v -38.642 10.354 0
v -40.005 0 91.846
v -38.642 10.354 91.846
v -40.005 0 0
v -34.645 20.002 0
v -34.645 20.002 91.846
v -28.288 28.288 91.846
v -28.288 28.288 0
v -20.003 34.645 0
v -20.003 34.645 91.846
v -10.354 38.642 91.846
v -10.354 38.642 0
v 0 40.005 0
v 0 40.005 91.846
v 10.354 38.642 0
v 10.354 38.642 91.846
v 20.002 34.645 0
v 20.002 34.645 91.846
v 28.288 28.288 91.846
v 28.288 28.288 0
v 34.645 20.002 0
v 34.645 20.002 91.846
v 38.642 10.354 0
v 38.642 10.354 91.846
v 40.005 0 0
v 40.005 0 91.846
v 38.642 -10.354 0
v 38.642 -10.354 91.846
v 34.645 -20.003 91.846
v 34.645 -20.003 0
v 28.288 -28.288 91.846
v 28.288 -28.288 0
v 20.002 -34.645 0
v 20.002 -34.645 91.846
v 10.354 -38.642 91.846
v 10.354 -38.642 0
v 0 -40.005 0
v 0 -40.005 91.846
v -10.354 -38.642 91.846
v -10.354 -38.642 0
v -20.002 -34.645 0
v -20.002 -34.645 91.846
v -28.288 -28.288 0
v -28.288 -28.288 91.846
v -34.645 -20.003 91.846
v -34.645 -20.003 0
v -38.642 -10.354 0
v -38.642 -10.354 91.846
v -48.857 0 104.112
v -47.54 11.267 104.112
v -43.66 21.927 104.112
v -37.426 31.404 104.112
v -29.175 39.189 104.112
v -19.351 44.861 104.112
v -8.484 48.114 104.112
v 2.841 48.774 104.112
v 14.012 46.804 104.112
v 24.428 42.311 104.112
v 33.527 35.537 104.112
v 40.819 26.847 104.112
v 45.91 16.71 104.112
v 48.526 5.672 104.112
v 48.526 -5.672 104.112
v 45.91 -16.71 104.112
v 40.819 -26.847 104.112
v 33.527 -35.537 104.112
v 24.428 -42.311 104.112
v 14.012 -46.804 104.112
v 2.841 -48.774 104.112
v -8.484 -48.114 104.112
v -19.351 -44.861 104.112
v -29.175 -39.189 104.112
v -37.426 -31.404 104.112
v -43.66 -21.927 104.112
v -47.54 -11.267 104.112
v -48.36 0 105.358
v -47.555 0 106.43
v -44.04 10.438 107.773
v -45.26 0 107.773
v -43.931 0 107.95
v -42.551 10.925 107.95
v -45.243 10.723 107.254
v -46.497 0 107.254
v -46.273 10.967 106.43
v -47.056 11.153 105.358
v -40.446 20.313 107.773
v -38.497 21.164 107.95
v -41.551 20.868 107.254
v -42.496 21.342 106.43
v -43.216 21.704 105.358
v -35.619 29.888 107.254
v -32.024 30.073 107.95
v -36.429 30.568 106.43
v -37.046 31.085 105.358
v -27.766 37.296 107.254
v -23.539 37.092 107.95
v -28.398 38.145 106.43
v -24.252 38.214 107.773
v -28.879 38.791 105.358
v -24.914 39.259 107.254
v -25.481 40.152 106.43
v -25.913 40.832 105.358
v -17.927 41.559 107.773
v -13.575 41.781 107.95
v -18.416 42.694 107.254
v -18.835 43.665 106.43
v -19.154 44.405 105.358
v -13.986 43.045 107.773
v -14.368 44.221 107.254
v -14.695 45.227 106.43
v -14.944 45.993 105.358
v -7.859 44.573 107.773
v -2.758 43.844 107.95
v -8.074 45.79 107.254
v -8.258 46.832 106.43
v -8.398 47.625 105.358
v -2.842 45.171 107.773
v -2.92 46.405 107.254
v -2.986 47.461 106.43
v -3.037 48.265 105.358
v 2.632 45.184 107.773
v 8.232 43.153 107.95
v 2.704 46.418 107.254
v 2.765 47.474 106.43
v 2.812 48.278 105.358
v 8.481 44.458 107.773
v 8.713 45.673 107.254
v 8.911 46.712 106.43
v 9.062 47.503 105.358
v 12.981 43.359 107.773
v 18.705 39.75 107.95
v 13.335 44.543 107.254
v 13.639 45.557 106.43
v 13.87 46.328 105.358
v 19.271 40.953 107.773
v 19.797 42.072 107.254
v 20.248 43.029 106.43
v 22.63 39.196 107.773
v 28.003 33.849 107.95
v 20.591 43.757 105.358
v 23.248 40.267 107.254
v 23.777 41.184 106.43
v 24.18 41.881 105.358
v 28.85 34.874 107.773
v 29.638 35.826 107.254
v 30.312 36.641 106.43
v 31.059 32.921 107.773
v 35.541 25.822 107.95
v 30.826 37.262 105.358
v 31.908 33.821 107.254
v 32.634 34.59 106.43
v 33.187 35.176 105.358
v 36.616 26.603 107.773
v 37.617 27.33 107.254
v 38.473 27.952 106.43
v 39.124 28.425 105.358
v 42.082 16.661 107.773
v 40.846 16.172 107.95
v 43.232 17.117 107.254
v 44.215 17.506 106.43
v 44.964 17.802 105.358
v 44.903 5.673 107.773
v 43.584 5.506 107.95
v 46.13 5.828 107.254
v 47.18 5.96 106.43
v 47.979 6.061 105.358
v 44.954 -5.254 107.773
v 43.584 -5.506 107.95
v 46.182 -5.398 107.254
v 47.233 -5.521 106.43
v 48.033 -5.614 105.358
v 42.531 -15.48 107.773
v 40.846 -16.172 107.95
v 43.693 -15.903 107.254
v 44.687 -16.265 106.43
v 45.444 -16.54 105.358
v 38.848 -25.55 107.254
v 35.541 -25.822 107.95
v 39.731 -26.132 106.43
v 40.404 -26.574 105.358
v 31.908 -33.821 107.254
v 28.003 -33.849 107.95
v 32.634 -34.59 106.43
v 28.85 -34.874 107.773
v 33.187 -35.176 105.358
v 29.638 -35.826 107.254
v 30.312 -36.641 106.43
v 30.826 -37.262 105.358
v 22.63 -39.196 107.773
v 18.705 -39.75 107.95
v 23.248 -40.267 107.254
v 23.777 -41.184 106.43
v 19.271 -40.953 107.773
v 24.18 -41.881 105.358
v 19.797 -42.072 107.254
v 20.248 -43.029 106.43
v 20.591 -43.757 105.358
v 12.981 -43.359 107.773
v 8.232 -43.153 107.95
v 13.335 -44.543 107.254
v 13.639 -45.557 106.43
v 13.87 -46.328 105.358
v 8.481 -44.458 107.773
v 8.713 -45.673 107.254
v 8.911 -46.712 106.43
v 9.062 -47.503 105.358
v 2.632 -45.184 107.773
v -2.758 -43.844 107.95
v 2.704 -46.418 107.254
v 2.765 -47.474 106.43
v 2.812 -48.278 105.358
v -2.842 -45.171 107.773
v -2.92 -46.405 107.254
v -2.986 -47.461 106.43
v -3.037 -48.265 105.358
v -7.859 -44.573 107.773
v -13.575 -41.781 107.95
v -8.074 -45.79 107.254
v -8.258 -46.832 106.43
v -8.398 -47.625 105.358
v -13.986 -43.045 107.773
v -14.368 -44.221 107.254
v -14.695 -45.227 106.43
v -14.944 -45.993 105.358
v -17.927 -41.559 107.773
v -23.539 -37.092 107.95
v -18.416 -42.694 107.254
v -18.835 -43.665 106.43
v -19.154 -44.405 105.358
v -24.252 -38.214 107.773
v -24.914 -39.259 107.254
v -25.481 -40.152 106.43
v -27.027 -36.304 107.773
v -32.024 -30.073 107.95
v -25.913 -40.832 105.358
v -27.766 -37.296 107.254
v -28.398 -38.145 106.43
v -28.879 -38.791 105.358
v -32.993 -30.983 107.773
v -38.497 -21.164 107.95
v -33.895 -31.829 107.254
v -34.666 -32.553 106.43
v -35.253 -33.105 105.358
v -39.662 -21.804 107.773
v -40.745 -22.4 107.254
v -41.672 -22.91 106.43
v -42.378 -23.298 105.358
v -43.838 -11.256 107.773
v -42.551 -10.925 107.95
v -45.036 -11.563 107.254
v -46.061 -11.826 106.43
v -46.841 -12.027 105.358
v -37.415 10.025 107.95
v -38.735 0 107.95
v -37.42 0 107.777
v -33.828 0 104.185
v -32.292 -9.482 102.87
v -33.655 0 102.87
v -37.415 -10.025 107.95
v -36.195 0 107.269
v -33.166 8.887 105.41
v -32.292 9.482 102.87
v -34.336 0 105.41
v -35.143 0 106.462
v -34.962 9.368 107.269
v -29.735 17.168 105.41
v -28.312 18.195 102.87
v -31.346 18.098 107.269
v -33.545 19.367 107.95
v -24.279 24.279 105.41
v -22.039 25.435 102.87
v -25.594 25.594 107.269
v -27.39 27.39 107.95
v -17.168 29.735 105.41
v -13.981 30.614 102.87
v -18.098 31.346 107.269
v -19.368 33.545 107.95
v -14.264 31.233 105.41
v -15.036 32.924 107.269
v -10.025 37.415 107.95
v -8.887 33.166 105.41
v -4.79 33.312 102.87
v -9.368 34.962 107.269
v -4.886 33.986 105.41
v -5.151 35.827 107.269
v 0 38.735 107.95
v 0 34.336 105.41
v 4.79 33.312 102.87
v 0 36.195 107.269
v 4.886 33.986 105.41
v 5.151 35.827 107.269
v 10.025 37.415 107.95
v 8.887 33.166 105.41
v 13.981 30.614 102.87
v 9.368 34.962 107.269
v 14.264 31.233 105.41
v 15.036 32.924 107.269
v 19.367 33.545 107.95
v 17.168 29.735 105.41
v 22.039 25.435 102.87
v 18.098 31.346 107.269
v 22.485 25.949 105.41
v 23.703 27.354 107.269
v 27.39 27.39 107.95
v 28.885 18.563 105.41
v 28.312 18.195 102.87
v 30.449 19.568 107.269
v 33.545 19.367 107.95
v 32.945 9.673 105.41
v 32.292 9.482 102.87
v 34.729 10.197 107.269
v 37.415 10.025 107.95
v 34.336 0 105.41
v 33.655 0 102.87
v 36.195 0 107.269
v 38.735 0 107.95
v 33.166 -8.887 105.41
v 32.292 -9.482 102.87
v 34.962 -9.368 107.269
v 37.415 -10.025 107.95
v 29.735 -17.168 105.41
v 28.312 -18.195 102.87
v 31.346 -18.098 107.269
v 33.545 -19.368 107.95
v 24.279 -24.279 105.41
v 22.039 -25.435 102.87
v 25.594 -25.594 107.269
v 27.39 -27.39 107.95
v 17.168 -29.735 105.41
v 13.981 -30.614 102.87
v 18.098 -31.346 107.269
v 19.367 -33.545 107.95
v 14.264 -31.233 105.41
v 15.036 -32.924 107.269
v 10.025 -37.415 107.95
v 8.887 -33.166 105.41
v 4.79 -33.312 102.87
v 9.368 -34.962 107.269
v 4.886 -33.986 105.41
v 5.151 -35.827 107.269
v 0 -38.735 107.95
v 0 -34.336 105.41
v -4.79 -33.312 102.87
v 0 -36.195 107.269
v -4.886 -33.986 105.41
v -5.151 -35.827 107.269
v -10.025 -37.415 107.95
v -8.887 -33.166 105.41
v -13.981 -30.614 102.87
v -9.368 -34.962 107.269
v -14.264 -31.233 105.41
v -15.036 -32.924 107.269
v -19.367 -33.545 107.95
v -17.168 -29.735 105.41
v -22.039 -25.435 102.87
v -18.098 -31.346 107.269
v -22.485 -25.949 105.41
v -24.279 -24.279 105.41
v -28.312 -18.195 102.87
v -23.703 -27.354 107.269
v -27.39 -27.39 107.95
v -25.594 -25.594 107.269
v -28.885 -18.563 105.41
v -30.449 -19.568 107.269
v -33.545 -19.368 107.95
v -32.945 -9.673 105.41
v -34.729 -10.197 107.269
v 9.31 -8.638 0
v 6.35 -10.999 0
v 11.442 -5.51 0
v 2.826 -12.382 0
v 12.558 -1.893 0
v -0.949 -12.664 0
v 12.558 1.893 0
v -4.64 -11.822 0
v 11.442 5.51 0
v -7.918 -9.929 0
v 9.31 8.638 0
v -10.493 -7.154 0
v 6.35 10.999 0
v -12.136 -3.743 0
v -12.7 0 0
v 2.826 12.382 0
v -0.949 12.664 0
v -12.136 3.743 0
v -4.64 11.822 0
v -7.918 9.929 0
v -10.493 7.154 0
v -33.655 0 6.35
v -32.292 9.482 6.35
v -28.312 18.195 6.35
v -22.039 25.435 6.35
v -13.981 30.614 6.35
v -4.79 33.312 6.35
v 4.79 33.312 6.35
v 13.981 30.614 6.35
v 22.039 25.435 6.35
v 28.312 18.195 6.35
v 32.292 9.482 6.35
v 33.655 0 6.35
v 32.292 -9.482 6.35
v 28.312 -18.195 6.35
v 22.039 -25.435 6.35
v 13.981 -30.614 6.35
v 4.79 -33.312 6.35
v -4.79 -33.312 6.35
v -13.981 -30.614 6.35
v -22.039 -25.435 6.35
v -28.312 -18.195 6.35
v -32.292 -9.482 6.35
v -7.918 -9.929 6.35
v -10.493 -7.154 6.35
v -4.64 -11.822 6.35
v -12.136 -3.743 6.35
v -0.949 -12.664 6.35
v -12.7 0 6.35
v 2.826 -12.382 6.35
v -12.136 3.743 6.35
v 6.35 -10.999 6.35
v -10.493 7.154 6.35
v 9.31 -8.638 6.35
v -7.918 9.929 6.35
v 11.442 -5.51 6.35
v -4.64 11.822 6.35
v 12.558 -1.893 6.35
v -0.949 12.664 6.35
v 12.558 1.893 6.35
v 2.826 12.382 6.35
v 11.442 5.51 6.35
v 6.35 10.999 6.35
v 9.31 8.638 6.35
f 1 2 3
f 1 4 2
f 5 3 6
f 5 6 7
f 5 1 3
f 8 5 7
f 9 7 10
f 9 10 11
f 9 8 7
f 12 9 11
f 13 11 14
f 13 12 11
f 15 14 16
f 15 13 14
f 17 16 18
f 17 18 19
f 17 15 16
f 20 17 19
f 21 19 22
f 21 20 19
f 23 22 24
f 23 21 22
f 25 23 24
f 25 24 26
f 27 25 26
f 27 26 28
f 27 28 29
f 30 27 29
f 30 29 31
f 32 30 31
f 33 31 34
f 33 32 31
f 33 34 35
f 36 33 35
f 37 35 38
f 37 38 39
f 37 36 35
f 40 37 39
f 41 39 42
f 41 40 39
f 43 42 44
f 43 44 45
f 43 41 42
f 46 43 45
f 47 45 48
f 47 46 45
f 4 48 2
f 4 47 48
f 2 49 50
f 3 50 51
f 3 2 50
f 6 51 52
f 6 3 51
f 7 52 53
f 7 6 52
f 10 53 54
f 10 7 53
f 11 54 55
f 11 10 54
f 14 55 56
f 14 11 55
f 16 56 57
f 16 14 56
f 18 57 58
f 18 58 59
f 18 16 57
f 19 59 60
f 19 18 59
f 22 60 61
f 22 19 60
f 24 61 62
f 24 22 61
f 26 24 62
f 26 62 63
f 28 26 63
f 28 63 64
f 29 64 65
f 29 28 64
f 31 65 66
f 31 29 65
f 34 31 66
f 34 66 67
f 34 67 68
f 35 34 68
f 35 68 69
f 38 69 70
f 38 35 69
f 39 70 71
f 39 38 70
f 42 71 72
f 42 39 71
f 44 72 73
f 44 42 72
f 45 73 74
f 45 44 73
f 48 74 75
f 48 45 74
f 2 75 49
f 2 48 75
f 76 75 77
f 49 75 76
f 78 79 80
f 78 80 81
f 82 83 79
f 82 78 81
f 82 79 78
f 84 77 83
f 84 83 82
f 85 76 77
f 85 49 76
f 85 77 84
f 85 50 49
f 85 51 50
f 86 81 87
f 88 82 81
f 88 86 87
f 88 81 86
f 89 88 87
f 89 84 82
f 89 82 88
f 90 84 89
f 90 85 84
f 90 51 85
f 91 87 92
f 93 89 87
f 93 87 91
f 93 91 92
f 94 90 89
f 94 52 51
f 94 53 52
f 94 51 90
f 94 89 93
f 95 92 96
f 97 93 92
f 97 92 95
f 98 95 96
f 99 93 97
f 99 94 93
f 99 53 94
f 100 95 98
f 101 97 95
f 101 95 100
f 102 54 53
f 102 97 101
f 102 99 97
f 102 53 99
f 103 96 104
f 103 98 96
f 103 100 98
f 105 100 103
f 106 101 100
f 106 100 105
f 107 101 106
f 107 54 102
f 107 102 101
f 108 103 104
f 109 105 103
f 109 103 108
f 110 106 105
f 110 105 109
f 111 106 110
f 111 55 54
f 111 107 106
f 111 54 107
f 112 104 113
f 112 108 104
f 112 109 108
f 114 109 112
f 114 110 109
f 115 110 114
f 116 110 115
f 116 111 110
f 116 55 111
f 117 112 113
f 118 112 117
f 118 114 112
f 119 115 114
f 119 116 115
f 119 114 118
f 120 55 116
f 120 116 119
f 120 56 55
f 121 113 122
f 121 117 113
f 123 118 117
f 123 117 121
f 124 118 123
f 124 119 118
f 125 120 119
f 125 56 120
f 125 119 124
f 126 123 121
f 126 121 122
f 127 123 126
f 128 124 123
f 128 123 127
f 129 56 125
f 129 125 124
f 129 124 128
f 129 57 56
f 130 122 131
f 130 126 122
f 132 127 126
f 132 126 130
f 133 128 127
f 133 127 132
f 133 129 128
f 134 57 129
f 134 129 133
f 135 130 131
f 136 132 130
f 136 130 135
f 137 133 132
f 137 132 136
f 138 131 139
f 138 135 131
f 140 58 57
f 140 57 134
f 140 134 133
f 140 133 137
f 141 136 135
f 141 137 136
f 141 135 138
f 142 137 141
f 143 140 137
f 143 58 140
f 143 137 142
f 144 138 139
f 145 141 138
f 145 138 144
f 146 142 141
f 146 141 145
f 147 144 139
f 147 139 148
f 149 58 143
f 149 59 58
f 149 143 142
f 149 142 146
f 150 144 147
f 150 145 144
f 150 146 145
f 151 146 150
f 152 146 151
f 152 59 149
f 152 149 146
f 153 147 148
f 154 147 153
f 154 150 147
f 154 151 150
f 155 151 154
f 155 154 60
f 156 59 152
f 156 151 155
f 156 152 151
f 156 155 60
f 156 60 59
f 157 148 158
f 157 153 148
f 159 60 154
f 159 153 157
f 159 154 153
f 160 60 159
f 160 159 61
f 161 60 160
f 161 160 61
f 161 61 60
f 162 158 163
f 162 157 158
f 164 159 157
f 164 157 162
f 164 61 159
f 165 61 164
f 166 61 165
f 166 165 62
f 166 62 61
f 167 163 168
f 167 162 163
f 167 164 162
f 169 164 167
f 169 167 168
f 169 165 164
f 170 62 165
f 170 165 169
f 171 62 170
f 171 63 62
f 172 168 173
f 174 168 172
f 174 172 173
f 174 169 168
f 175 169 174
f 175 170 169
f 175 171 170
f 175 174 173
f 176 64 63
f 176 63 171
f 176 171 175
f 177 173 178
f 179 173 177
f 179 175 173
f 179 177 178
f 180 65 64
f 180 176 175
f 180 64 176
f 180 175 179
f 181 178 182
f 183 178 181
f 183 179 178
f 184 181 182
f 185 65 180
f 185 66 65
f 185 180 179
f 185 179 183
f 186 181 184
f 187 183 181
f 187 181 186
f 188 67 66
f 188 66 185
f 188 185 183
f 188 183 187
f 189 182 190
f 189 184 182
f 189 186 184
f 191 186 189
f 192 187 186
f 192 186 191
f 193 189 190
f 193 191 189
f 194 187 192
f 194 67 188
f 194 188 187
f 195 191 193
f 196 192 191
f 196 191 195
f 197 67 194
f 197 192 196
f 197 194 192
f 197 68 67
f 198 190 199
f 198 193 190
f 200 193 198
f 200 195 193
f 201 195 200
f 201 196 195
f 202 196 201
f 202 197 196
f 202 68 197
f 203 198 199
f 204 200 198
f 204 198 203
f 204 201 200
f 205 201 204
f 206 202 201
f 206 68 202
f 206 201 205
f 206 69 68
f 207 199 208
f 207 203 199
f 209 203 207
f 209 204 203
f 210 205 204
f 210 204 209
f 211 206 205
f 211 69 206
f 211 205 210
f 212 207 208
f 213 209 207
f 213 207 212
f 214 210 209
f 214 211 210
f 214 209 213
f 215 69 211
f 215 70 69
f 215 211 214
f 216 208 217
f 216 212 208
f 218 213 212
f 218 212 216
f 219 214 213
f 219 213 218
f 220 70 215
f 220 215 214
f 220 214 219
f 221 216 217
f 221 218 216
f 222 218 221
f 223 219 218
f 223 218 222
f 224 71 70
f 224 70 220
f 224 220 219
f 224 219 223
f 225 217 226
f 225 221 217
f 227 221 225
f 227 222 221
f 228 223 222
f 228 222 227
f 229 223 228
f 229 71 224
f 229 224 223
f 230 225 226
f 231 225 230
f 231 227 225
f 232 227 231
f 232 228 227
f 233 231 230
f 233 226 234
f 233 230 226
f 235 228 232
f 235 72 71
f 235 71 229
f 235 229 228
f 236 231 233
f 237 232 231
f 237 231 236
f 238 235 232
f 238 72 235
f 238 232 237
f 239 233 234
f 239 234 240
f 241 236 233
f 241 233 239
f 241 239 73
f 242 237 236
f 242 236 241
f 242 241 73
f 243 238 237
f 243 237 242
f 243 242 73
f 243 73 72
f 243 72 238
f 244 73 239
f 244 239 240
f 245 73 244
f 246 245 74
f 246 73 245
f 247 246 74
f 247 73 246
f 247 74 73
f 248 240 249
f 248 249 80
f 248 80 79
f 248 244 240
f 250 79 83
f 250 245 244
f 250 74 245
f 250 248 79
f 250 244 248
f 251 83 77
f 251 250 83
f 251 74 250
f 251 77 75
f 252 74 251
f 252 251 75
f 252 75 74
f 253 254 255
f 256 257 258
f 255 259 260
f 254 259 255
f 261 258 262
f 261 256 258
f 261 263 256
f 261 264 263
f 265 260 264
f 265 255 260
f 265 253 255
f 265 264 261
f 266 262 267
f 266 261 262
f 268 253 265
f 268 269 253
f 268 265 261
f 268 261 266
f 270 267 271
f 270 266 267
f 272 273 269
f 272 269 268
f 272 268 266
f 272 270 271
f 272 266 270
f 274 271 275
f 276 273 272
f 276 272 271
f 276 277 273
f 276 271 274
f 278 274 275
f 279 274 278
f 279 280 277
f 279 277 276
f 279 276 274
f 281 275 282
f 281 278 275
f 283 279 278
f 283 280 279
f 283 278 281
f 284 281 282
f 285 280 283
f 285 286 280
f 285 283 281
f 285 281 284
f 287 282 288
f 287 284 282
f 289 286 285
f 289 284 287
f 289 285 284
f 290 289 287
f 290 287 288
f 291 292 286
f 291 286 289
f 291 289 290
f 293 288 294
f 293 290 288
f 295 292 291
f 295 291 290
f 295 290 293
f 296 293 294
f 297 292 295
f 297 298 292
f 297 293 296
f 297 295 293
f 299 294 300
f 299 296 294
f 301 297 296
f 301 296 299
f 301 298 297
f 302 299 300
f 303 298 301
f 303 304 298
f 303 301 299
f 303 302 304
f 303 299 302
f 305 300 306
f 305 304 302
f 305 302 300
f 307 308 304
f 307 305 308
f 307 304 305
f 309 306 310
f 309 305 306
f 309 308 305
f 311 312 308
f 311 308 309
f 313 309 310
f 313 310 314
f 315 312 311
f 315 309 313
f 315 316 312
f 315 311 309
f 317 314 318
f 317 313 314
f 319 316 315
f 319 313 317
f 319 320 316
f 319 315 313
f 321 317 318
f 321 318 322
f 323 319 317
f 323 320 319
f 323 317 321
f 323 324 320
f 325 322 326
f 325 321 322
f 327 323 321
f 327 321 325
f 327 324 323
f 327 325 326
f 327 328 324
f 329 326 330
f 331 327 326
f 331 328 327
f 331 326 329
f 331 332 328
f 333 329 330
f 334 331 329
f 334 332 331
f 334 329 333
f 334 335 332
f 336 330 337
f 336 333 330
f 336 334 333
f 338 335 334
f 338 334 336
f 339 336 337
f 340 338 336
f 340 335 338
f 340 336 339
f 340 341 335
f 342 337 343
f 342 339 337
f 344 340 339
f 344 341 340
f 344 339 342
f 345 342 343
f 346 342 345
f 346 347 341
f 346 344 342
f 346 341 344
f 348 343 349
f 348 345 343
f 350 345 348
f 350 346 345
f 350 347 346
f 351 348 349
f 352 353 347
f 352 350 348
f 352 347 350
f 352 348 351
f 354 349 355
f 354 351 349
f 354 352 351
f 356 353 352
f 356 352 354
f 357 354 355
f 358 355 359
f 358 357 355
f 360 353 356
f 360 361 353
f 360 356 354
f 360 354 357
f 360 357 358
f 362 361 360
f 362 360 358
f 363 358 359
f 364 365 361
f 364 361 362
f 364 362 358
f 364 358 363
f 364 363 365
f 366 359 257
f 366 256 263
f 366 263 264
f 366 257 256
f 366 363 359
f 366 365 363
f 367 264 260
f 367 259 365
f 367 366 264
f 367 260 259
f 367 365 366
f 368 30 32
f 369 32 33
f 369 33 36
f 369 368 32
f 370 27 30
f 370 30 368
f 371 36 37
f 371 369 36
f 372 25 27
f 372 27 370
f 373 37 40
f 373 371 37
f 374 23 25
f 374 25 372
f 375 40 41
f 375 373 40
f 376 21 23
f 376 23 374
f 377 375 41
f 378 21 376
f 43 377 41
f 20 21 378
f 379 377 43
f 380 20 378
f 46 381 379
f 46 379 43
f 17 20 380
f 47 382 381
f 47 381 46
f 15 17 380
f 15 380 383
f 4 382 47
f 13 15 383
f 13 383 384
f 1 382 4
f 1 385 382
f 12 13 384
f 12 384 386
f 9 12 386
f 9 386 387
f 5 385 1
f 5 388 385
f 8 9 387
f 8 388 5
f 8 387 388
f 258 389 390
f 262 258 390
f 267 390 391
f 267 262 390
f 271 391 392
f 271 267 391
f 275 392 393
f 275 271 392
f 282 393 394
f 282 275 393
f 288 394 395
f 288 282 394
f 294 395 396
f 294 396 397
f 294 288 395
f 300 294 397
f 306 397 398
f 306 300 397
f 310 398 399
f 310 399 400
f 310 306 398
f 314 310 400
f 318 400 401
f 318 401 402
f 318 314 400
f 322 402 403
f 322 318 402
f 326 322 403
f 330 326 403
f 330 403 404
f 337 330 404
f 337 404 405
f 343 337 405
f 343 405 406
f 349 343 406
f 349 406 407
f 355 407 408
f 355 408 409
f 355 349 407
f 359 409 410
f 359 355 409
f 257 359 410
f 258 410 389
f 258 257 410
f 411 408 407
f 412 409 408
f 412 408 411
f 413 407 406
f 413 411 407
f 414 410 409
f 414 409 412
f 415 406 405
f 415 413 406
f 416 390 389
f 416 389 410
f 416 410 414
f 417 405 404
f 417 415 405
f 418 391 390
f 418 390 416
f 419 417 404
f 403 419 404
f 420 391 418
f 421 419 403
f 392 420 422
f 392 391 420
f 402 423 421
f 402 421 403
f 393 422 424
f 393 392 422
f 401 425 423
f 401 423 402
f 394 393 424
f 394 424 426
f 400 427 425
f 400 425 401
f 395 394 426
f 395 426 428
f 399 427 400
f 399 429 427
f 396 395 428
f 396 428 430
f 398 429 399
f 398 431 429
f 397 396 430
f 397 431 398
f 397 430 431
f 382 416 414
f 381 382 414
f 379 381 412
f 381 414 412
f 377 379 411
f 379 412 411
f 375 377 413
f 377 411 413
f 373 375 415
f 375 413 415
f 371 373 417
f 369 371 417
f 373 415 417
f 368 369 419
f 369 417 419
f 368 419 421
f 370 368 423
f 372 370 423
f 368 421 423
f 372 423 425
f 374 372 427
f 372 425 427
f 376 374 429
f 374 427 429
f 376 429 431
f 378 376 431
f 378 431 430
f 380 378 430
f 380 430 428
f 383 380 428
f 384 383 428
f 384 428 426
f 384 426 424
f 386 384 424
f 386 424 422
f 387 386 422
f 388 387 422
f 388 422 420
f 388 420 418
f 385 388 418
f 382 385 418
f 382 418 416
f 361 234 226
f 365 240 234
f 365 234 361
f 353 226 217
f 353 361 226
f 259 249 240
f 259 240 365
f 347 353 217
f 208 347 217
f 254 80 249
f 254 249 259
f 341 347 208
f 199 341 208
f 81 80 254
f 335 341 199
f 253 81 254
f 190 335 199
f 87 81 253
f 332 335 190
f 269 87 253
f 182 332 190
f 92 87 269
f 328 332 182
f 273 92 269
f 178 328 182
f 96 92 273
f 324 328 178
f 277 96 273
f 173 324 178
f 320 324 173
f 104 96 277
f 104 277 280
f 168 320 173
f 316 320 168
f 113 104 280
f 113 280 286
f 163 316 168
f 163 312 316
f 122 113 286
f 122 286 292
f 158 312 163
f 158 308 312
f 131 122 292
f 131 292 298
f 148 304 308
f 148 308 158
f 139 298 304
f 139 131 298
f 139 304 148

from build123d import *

# Parameters (mm, degrees)
F4_D = 25.4


# Not quite as in the source:
# - a fillet or chamfer that OpenCascade refuses, or shapes differently, is made with other operations: its cross-section is extruded or revolved along the edge and cut away or added


with BuildPart() as f1:
    # F0 (on Front) → F1 (revolve)
    with BuildSketch(Plane.XZ):
        Polygon((-33.655, 107.95), (-40.005, 107.95), (-48.8566160202, 107.95), (-48.8566160202, 104.1120141745), (-40.005, 91.8462350965), (-40.005, 0), (0, 0), (0, 6.35), (-33.655, 6.35), align=None)
    revolve(axis=Axis((0, 0, 3.175), (0, 0, -1)))

    # F2: fillet of radius 5.08 on 2 edges, made by hand

    # F2_s1 → F2_t2 (revolve, cut)
    with BuildSketch(Plane.XZ):
        with BuildLine():
            ThreePointArc((-33.655, 102.87), (-35.1428975516, 106.4621024484), (-38.735, 107.95))
            Line((-38.735, 107.95), (-33.655, 107.95))
            Line((-33.655, 107.95), (-33.655, 102.87))
        make_face()
    revolve(axis=Axis((0, 0, 107.95), (0, 0, -1)), mode=Mode.SUBTRACT)

    # F2_s3 → F2_t4 (revolve, cut)
    with BuildSketch(Plane.XZ):
        with BuildLine():
            ThreePointArc((-43.9307860606, 107.95), (-47.0530422956, 106.8772329609), (-48.8566160202, 104.1120141745))
            Line((-48.8566160202, 104.1120141745), (-48.8566160202, 107.95))
            Line((-48.8566160202, 107.95), (-43.9307860606, 107.95))
        make_face()
    revolve(axis=Axis((0, 0, 107.95), (0, 0, -1)), mode=Mode.SUBTRACT)

    # F4 (through all)
    with Locations(Plane(origin=(0, 0, 0), x_dir=(1, 0, 0), z_dir=(0, 0, -1))):
        with Locations((0, 0)):
            Hole(F4_D / 2)


solid = f1.part
